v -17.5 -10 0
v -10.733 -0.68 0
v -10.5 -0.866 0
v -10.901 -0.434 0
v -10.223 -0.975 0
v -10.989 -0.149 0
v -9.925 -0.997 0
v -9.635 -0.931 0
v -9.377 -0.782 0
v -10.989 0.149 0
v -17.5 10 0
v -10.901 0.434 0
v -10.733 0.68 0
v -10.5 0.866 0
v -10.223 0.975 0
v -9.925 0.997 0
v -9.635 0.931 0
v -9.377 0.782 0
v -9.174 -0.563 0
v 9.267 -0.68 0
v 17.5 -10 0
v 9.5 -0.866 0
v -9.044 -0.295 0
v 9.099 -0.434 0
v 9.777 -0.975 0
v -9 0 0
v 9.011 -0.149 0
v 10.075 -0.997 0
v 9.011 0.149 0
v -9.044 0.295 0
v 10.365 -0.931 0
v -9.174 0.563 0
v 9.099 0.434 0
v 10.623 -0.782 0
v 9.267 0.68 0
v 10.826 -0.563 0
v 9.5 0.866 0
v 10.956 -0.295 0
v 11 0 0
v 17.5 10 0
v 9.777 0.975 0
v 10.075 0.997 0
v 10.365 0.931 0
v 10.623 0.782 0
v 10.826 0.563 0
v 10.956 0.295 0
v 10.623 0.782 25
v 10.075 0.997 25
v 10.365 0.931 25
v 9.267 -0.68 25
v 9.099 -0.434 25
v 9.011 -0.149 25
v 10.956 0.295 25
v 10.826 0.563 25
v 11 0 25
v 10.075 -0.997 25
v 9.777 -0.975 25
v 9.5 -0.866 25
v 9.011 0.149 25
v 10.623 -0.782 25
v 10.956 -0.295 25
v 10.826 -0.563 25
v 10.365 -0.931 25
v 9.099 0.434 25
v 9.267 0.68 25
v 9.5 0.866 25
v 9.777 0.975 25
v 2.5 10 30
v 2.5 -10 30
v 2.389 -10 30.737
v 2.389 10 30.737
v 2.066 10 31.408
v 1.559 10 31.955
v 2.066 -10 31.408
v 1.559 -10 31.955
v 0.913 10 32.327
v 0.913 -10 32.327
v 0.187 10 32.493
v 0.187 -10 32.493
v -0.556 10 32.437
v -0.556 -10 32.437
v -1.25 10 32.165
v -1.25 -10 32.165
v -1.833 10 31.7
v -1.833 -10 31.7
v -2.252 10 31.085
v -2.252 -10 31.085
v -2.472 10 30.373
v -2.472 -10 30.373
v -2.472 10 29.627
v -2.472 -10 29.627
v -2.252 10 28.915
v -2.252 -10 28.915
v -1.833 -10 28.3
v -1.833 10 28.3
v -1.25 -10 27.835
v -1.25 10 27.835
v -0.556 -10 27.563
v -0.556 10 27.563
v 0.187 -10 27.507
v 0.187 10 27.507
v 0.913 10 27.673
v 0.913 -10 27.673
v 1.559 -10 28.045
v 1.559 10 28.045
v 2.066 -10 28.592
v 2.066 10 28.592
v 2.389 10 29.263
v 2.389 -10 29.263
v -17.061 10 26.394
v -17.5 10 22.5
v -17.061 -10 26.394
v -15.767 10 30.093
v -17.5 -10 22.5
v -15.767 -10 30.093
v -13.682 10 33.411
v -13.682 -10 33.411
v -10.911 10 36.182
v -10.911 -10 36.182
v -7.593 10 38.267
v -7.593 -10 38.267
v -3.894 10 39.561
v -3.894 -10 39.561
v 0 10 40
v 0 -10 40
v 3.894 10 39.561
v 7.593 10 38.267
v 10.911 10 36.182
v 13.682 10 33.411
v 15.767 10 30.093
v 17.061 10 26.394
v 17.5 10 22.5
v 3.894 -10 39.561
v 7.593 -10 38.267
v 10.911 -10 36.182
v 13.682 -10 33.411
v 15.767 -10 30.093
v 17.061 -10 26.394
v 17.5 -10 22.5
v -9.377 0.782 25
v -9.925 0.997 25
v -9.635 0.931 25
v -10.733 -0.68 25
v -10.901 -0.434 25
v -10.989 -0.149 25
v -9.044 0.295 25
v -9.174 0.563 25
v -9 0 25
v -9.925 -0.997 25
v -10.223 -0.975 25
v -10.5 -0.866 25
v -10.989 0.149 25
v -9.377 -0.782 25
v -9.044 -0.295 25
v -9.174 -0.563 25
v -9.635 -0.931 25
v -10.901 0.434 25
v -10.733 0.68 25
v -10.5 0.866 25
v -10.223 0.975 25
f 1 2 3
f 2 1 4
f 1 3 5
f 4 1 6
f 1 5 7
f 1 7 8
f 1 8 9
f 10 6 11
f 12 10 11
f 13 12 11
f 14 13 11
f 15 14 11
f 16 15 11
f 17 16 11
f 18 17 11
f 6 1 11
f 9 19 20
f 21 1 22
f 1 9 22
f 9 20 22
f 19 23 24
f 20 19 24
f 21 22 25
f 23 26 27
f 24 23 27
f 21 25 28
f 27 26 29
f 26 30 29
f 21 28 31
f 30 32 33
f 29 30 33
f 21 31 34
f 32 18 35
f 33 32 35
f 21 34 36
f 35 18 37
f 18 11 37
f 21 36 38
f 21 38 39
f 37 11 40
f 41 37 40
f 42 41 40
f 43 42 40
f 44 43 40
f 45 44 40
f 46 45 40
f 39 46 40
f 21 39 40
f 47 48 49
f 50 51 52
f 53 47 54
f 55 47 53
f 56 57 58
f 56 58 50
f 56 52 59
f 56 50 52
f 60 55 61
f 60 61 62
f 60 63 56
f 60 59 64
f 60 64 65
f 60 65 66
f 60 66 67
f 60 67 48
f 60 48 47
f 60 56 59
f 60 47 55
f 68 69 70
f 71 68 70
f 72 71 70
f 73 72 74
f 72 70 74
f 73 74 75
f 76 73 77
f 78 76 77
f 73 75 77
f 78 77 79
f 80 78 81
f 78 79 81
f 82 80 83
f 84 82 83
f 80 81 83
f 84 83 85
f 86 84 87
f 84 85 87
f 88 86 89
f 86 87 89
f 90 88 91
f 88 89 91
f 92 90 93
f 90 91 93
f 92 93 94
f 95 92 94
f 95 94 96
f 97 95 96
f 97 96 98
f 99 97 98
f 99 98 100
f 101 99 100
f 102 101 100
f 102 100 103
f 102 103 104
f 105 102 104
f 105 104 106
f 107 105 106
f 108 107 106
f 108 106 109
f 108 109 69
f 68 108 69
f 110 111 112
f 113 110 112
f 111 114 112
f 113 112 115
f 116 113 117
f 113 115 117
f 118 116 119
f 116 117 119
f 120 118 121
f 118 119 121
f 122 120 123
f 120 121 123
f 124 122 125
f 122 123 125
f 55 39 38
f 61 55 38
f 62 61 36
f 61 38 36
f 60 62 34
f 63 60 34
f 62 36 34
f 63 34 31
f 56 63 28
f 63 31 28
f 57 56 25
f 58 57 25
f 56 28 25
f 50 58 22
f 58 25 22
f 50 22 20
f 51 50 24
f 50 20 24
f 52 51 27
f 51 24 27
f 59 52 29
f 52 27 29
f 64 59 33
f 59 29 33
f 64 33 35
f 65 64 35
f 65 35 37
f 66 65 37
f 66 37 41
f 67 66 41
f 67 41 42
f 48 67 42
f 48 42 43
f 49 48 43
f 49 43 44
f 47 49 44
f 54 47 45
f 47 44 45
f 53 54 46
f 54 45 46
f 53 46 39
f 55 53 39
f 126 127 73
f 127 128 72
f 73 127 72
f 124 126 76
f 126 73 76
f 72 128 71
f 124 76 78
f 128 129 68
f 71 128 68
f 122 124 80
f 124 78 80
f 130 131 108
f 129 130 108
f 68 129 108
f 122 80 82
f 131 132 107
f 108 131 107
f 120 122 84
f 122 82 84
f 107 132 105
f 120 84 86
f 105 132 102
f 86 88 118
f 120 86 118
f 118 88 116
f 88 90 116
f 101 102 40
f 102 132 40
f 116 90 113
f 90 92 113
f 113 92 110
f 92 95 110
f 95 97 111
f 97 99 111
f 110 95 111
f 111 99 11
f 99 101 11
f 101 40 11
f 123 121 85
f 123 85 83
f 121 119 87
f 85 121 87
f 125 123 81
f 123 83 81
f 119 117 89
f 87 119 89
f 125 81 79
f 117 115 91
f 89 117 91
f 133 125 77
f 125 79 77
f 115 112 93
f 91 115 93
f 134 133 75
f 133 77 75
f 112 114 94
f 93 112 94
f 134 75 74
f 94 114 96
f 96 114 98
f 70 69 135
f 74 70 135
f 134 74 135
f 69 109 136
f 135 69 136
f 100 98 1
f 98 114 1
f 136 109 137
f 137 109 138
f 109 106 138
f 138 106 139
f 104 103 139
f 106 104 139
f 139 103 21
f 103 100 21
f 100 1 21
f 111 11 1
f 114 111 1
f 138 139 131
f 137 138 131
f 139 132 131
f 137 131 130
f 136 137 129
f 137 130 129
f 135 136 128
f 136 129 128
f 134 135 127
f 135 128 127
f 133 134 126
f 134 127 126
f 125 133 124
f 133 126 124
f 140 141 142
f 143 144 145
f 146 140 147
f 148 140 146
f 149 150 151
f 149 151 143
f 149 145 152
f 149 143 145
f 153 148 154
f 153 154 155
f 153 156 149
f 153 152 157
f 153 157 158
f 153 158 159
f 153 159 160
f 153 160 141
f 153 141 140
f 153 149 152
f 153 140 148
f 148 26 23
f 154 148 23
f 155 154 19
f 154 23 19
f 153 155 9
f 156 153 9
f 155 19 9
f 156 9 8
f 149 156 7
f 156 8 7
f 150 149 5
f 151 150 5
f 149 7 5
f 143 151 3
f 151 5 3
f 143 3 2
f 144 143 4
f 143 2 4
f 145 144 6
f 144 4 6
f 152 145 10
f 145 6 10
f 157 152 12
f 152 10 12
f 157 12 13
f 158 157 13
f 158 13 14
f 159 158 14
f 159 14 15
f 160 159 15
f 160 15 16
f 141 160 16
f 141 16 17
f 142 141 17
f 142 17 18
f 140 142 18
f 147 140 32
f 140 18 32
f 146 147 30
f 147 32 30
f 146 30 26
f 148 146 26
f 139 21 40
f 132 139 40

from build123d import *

# Parameters (mm, degrees)
F1_DEPTH = 40
F2_R     = 17.49999
F3_R     = 2.5
F4_DEPTH = 25
F5_R     = 1
F6_DEPTH = 25


# Not quite as in the source:
# - a fillet or chamfer is up to 0.001 mm smaller than in the source, because OpenCascade refuses the exact size


with BuildPart() as f1:
    # F0 (on Top) → F1 (new body)
    with BuildSketch(Plane.XY):
        Polygon((17.5, 10), (0, 10), (-17.5, 10), (-17.5, -10), (17.5, -10), align=None)
    extrude(amount=F1_DEPTH)

    # F2 (radius 17.5 in the source; OpenCascade refuses exactly that, so slightly less here)
    f2_edges = [f1.edges().sort_by_distance(p)[0] for p in [
        (17.5, 0, 40),
        (-17.5, 0, 40),
    ]]
    fillet(f2_edges, radius=F2_R)

    # F3 (on face) → F4 (cut)
    with BuildSketch(Plane.XZ.offset(10)):
        with Locations((0, 30)):
            Circle(F3_R)
    extrude(amount=-F4_DEPTH, mode=Mode.SUBTRACT)

    # F5 (on face) → F6 (cut)
    with BuildSketch(Plane(origin=(0, 0, 0), x_dir=(1, 0, 0), z_dir=(0, 0, -1))):
        with Locations((10, 0)):
            Circle(F5_R)
        with Locations((-10, 0)):
            Circle(F5_R)
    extrude(amount=-F6_DEPTH, mode=Mode.SUBTRACT)


solid = f1.part
